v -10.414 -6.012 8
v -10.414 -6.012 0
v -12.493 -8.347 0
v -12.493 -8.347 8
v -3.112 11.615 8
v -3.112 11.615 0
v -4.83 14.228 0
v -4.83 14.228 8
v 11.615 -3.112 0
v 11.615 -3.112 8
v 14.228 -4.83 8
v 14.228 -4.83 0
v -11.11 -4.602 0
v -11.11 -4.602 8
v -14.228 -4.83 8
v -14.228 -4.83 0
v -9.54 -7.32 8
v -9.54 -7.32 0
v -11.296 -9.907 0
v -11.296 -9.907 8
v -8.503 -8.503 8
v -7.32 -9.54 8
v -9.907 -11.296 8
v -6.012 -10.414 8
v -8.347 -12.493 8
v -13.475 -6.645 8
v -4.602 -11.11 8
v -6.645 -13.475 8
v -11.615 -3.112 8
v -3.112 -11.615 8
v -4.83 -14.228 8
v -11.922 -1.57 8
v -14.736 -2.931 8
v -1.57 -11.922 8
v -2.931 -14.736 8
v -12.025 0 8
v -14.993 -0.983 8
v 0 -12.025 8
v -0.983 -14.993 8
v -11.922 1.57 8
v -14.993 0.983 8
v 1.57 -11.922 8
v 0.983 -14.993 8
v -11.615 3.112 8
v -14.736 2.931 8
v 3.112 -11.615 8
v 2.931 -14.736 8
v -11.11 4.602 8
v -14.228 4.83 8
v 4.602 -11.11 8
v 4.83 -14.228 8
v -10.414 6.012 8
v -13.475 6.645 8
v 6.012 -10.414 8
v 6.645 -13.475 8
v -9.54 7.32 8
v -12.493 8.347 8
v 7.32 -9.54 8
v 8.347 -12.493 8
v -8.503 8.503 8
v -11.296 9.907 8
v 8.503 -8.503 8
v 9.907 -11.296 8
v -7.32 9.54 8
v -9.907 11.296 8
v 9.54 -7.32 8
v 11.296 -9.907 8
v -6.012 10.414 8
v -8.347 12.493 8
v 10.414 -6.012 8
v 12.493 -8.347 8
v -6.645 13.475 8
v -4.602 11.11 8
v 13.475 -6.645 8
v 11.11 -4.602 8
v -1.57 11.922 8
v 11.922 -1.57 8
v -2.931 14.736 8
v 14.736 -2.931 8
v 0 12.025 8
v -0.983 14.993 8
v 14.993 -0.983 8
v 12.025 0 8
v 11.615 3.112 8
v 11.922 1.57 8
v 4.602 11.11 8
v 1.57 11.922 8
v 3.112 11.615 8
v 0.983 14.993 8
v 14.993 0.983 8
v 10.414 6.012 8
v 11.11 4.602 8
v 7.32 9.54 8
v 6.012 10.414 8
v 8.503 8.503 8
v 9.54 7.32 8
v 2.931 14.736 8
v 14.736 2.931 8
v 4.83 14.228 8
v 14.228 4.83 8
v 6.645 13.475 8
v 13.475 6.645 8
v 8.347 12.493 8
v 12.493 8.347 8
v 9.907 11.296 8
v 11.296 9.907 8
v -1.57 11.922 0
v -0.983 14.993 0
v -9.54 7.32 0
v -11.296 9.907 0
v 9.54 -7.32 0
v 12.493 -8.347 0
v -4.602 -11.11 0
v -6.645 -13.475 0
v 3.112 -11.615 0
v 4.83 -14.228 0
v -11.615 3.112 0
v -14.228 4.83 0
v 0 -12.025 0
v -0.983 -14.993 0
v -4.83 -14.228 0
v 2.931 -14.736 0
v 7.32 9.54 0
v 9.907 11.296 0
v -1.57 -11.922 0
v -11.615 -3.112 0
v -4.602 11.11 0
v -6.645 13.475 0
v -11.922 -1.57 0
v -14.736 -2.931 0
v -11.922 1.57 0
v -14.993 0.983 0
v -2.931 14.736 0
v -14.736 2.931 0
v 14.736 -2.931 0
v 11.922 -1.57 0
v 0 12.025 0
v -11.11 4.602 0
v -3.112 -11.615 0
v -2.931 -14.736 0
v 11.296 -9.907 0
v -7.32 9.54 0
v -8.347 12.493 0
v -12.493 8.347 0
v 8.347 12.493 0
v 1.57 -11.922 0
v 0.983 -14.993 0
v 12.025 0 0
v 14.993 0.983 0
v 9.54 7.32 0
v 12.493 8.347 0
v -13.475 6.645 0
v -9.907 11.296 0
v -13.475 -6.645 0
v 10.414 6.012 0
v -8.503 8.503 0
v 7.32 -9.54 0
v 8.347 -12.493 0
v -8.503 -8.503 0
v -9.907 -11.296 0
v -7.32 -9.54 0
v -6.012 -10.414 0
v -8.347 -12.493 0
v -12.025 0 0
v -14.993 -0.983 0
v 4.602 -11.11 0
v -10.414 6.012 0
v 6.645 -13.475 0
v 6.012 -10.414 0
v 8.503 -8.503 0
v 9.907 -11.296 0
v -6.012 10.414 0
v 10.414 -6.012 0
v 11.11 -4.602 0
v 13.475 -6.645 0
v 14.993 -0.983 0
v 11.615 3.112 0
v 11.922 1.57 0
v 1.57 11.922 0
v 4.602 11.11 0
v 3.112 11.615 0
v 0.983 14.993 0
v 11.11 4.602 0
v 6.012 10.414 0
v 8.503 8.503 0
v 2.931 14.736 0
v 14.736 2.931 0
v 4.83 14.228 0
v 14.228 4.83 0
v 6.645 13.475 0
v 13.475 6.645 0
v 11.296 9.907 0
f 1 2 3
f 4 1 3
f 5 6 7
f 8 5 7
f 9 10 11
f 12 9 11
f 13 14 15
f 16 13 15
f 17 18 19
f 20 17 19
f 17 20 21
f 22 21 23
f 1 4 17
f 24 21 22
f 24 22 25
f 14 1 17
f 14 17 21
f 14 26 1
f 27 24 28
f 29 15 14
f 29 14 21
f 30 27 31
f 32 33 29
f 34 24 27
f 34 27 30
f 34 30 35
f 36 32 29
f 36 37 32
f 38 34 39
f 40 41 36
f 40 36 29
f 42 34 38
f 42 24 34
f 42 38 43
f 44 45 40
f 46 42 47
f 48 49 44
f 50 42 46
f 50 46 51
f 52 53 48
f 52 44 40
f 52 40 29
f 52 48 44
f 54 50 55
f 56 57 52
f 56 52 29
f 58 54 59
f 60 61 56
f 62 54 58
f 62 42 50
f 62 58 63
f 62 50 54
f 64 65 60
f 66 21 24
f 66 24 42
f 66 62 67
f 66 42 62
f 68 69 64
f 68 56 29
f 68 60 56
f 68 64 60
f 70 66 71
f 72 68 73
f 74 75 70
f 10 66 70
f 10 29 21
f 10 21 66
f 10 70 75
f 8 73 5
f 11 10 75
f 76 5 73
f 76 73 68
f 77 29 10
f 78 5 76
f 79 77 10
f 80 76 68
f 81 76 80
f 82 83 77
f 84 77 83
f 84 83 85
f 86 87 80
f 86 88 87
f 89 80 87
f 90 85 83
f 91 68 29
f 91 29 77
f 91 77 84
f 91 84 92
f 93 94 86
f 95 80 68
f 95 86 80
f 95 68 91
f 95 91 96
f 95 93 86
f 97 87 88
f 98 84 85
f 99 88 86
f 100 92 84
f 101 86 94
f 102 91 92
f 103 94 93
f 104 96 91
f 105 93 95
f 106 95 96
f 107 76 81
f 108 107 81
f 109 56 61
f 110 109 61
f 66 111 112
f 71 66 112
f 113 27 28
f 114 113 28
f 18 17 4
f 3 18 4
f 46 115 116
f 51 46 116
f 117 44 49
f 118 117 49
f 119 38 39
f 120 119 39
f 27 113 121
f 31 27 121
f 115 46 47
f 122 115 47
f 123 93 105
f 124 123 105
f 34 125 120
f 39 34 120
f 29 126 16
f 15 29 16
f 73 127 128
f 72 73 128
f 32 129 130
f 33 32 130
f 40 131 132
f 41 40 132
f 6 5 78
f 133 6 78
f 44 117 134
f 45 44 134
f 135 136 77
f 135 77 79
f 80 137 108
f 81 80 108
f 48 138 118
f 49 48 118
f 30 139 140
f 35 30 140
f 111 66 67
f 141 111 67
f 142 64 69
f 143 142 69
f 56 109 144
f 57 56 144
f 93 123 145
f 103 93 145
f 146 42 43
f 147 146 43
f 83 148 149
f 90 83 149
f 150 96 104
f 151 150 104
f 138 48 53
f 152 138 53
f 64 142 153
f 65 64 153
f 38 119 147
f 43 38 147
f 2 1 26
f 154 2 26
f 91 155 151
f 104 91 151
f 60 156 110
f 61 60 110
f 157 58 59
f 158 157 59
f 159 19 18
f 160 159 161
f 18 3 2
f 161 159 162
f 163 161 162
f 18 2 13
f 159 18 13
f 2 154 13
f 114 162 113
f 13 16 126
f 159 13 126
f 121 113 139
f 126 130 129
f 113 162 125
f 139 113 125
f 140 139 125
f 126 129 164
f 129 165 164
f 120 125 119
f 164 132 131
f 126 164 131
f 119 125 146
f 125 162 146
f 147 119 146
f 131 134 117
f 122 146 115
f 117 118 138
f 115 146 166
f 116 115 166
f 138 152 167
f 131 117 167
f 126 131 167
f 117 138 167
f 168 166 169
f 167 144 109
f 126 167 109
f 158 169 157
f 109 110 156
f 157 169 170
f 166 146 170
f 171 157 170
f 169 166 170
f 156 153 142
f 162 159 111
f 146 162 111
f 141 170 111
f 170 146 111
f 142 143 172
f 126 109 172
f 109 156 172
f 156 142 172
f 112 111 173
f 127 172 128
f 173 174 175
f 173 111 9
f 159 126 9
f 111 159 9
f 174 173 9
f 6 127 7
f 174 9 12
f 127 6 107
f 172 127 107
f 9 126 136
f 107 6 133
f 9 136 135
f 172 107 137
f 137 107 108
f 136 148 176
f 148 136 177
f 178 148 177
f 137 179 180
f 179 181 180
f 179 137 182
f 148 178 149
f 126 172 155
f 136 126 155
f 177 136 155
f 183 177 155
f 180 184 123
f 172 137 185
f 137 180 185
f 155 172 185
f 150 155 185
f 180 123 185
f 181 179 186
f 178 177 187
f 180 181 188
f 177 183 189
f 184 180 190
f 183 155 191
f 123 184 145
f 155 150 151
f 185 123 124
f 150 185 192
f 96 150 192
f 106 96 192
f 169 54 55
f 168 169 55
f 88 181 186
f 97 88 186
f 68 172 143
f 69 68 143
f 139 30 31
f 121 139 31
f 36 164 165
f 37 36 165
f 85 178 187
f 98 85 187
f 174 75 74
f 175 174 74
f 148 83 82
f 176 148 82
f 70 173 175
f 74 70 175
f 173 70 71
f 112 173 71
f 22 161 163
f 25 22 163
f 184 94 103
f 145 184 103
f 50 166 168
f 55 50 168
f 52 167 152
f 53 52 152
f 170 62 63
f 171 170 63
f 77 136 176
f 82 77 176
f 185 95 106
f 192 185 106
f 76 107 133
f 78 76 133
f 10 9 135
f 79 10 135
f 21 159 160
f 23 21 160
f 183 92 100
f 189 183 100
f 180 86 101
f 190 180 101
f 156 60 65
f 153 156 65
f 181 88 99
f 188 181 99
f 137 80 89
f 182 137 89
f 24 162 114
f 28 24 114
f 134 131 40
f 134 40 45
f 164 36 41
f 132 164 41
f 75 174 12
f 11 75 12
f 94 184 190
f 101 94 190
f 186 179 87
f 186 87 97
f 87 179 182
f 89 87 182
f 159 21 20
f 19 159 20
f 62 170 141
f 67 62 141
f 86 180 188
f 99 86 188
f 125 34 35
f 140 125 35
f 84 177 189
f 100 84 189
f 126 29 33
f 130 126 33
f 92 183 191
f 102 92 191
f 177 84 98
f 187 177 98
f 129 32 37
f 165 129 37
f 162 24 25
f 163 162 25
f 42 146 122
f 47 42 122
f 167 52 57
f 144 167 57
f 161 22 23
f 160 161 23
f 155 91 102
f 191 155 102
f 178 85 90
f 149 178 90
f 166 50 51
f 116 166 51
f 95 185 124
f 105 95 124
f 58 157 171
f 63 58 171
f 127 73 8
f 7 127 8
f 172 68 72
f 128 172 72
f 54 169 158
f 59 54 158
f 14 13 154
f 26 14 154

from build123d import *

# Parameters (mm, degrees)
PAD_DEPTH          = 8
POLARPATTERN_COUNT = 48


with BuildPart() as part:
    # Sketch → Pad (new body)
    with BuildSketch(Plane.XY):
        with BuildLine():
            ThreePointArc((0, 12.0248747975), (-0.7864644404, -11.9991286175), (1.5695611192, 11.9220003266))
            Line((1.5695611192, 11.9220003266), (0.982673828, 14.9927053872))
            Line((0, 12.0248747975), (0.982673828, 14.9927053872))
        make_face()
    extrude(amount=PAD_DEPTH)

    # PolarPattern: part ×48 about axis
    polarpattern_axis = Axis((0, 0, 0), (0, 0, 1))


with BuildPart() as part_1:
    add(part.part)
    for i in range(1, POLARPATTERN_COUNT):
        add(part.part.rotate(polarpattern_axis, i * 360 / POLARPATTERN_COUNT))


solid = part_1.part
